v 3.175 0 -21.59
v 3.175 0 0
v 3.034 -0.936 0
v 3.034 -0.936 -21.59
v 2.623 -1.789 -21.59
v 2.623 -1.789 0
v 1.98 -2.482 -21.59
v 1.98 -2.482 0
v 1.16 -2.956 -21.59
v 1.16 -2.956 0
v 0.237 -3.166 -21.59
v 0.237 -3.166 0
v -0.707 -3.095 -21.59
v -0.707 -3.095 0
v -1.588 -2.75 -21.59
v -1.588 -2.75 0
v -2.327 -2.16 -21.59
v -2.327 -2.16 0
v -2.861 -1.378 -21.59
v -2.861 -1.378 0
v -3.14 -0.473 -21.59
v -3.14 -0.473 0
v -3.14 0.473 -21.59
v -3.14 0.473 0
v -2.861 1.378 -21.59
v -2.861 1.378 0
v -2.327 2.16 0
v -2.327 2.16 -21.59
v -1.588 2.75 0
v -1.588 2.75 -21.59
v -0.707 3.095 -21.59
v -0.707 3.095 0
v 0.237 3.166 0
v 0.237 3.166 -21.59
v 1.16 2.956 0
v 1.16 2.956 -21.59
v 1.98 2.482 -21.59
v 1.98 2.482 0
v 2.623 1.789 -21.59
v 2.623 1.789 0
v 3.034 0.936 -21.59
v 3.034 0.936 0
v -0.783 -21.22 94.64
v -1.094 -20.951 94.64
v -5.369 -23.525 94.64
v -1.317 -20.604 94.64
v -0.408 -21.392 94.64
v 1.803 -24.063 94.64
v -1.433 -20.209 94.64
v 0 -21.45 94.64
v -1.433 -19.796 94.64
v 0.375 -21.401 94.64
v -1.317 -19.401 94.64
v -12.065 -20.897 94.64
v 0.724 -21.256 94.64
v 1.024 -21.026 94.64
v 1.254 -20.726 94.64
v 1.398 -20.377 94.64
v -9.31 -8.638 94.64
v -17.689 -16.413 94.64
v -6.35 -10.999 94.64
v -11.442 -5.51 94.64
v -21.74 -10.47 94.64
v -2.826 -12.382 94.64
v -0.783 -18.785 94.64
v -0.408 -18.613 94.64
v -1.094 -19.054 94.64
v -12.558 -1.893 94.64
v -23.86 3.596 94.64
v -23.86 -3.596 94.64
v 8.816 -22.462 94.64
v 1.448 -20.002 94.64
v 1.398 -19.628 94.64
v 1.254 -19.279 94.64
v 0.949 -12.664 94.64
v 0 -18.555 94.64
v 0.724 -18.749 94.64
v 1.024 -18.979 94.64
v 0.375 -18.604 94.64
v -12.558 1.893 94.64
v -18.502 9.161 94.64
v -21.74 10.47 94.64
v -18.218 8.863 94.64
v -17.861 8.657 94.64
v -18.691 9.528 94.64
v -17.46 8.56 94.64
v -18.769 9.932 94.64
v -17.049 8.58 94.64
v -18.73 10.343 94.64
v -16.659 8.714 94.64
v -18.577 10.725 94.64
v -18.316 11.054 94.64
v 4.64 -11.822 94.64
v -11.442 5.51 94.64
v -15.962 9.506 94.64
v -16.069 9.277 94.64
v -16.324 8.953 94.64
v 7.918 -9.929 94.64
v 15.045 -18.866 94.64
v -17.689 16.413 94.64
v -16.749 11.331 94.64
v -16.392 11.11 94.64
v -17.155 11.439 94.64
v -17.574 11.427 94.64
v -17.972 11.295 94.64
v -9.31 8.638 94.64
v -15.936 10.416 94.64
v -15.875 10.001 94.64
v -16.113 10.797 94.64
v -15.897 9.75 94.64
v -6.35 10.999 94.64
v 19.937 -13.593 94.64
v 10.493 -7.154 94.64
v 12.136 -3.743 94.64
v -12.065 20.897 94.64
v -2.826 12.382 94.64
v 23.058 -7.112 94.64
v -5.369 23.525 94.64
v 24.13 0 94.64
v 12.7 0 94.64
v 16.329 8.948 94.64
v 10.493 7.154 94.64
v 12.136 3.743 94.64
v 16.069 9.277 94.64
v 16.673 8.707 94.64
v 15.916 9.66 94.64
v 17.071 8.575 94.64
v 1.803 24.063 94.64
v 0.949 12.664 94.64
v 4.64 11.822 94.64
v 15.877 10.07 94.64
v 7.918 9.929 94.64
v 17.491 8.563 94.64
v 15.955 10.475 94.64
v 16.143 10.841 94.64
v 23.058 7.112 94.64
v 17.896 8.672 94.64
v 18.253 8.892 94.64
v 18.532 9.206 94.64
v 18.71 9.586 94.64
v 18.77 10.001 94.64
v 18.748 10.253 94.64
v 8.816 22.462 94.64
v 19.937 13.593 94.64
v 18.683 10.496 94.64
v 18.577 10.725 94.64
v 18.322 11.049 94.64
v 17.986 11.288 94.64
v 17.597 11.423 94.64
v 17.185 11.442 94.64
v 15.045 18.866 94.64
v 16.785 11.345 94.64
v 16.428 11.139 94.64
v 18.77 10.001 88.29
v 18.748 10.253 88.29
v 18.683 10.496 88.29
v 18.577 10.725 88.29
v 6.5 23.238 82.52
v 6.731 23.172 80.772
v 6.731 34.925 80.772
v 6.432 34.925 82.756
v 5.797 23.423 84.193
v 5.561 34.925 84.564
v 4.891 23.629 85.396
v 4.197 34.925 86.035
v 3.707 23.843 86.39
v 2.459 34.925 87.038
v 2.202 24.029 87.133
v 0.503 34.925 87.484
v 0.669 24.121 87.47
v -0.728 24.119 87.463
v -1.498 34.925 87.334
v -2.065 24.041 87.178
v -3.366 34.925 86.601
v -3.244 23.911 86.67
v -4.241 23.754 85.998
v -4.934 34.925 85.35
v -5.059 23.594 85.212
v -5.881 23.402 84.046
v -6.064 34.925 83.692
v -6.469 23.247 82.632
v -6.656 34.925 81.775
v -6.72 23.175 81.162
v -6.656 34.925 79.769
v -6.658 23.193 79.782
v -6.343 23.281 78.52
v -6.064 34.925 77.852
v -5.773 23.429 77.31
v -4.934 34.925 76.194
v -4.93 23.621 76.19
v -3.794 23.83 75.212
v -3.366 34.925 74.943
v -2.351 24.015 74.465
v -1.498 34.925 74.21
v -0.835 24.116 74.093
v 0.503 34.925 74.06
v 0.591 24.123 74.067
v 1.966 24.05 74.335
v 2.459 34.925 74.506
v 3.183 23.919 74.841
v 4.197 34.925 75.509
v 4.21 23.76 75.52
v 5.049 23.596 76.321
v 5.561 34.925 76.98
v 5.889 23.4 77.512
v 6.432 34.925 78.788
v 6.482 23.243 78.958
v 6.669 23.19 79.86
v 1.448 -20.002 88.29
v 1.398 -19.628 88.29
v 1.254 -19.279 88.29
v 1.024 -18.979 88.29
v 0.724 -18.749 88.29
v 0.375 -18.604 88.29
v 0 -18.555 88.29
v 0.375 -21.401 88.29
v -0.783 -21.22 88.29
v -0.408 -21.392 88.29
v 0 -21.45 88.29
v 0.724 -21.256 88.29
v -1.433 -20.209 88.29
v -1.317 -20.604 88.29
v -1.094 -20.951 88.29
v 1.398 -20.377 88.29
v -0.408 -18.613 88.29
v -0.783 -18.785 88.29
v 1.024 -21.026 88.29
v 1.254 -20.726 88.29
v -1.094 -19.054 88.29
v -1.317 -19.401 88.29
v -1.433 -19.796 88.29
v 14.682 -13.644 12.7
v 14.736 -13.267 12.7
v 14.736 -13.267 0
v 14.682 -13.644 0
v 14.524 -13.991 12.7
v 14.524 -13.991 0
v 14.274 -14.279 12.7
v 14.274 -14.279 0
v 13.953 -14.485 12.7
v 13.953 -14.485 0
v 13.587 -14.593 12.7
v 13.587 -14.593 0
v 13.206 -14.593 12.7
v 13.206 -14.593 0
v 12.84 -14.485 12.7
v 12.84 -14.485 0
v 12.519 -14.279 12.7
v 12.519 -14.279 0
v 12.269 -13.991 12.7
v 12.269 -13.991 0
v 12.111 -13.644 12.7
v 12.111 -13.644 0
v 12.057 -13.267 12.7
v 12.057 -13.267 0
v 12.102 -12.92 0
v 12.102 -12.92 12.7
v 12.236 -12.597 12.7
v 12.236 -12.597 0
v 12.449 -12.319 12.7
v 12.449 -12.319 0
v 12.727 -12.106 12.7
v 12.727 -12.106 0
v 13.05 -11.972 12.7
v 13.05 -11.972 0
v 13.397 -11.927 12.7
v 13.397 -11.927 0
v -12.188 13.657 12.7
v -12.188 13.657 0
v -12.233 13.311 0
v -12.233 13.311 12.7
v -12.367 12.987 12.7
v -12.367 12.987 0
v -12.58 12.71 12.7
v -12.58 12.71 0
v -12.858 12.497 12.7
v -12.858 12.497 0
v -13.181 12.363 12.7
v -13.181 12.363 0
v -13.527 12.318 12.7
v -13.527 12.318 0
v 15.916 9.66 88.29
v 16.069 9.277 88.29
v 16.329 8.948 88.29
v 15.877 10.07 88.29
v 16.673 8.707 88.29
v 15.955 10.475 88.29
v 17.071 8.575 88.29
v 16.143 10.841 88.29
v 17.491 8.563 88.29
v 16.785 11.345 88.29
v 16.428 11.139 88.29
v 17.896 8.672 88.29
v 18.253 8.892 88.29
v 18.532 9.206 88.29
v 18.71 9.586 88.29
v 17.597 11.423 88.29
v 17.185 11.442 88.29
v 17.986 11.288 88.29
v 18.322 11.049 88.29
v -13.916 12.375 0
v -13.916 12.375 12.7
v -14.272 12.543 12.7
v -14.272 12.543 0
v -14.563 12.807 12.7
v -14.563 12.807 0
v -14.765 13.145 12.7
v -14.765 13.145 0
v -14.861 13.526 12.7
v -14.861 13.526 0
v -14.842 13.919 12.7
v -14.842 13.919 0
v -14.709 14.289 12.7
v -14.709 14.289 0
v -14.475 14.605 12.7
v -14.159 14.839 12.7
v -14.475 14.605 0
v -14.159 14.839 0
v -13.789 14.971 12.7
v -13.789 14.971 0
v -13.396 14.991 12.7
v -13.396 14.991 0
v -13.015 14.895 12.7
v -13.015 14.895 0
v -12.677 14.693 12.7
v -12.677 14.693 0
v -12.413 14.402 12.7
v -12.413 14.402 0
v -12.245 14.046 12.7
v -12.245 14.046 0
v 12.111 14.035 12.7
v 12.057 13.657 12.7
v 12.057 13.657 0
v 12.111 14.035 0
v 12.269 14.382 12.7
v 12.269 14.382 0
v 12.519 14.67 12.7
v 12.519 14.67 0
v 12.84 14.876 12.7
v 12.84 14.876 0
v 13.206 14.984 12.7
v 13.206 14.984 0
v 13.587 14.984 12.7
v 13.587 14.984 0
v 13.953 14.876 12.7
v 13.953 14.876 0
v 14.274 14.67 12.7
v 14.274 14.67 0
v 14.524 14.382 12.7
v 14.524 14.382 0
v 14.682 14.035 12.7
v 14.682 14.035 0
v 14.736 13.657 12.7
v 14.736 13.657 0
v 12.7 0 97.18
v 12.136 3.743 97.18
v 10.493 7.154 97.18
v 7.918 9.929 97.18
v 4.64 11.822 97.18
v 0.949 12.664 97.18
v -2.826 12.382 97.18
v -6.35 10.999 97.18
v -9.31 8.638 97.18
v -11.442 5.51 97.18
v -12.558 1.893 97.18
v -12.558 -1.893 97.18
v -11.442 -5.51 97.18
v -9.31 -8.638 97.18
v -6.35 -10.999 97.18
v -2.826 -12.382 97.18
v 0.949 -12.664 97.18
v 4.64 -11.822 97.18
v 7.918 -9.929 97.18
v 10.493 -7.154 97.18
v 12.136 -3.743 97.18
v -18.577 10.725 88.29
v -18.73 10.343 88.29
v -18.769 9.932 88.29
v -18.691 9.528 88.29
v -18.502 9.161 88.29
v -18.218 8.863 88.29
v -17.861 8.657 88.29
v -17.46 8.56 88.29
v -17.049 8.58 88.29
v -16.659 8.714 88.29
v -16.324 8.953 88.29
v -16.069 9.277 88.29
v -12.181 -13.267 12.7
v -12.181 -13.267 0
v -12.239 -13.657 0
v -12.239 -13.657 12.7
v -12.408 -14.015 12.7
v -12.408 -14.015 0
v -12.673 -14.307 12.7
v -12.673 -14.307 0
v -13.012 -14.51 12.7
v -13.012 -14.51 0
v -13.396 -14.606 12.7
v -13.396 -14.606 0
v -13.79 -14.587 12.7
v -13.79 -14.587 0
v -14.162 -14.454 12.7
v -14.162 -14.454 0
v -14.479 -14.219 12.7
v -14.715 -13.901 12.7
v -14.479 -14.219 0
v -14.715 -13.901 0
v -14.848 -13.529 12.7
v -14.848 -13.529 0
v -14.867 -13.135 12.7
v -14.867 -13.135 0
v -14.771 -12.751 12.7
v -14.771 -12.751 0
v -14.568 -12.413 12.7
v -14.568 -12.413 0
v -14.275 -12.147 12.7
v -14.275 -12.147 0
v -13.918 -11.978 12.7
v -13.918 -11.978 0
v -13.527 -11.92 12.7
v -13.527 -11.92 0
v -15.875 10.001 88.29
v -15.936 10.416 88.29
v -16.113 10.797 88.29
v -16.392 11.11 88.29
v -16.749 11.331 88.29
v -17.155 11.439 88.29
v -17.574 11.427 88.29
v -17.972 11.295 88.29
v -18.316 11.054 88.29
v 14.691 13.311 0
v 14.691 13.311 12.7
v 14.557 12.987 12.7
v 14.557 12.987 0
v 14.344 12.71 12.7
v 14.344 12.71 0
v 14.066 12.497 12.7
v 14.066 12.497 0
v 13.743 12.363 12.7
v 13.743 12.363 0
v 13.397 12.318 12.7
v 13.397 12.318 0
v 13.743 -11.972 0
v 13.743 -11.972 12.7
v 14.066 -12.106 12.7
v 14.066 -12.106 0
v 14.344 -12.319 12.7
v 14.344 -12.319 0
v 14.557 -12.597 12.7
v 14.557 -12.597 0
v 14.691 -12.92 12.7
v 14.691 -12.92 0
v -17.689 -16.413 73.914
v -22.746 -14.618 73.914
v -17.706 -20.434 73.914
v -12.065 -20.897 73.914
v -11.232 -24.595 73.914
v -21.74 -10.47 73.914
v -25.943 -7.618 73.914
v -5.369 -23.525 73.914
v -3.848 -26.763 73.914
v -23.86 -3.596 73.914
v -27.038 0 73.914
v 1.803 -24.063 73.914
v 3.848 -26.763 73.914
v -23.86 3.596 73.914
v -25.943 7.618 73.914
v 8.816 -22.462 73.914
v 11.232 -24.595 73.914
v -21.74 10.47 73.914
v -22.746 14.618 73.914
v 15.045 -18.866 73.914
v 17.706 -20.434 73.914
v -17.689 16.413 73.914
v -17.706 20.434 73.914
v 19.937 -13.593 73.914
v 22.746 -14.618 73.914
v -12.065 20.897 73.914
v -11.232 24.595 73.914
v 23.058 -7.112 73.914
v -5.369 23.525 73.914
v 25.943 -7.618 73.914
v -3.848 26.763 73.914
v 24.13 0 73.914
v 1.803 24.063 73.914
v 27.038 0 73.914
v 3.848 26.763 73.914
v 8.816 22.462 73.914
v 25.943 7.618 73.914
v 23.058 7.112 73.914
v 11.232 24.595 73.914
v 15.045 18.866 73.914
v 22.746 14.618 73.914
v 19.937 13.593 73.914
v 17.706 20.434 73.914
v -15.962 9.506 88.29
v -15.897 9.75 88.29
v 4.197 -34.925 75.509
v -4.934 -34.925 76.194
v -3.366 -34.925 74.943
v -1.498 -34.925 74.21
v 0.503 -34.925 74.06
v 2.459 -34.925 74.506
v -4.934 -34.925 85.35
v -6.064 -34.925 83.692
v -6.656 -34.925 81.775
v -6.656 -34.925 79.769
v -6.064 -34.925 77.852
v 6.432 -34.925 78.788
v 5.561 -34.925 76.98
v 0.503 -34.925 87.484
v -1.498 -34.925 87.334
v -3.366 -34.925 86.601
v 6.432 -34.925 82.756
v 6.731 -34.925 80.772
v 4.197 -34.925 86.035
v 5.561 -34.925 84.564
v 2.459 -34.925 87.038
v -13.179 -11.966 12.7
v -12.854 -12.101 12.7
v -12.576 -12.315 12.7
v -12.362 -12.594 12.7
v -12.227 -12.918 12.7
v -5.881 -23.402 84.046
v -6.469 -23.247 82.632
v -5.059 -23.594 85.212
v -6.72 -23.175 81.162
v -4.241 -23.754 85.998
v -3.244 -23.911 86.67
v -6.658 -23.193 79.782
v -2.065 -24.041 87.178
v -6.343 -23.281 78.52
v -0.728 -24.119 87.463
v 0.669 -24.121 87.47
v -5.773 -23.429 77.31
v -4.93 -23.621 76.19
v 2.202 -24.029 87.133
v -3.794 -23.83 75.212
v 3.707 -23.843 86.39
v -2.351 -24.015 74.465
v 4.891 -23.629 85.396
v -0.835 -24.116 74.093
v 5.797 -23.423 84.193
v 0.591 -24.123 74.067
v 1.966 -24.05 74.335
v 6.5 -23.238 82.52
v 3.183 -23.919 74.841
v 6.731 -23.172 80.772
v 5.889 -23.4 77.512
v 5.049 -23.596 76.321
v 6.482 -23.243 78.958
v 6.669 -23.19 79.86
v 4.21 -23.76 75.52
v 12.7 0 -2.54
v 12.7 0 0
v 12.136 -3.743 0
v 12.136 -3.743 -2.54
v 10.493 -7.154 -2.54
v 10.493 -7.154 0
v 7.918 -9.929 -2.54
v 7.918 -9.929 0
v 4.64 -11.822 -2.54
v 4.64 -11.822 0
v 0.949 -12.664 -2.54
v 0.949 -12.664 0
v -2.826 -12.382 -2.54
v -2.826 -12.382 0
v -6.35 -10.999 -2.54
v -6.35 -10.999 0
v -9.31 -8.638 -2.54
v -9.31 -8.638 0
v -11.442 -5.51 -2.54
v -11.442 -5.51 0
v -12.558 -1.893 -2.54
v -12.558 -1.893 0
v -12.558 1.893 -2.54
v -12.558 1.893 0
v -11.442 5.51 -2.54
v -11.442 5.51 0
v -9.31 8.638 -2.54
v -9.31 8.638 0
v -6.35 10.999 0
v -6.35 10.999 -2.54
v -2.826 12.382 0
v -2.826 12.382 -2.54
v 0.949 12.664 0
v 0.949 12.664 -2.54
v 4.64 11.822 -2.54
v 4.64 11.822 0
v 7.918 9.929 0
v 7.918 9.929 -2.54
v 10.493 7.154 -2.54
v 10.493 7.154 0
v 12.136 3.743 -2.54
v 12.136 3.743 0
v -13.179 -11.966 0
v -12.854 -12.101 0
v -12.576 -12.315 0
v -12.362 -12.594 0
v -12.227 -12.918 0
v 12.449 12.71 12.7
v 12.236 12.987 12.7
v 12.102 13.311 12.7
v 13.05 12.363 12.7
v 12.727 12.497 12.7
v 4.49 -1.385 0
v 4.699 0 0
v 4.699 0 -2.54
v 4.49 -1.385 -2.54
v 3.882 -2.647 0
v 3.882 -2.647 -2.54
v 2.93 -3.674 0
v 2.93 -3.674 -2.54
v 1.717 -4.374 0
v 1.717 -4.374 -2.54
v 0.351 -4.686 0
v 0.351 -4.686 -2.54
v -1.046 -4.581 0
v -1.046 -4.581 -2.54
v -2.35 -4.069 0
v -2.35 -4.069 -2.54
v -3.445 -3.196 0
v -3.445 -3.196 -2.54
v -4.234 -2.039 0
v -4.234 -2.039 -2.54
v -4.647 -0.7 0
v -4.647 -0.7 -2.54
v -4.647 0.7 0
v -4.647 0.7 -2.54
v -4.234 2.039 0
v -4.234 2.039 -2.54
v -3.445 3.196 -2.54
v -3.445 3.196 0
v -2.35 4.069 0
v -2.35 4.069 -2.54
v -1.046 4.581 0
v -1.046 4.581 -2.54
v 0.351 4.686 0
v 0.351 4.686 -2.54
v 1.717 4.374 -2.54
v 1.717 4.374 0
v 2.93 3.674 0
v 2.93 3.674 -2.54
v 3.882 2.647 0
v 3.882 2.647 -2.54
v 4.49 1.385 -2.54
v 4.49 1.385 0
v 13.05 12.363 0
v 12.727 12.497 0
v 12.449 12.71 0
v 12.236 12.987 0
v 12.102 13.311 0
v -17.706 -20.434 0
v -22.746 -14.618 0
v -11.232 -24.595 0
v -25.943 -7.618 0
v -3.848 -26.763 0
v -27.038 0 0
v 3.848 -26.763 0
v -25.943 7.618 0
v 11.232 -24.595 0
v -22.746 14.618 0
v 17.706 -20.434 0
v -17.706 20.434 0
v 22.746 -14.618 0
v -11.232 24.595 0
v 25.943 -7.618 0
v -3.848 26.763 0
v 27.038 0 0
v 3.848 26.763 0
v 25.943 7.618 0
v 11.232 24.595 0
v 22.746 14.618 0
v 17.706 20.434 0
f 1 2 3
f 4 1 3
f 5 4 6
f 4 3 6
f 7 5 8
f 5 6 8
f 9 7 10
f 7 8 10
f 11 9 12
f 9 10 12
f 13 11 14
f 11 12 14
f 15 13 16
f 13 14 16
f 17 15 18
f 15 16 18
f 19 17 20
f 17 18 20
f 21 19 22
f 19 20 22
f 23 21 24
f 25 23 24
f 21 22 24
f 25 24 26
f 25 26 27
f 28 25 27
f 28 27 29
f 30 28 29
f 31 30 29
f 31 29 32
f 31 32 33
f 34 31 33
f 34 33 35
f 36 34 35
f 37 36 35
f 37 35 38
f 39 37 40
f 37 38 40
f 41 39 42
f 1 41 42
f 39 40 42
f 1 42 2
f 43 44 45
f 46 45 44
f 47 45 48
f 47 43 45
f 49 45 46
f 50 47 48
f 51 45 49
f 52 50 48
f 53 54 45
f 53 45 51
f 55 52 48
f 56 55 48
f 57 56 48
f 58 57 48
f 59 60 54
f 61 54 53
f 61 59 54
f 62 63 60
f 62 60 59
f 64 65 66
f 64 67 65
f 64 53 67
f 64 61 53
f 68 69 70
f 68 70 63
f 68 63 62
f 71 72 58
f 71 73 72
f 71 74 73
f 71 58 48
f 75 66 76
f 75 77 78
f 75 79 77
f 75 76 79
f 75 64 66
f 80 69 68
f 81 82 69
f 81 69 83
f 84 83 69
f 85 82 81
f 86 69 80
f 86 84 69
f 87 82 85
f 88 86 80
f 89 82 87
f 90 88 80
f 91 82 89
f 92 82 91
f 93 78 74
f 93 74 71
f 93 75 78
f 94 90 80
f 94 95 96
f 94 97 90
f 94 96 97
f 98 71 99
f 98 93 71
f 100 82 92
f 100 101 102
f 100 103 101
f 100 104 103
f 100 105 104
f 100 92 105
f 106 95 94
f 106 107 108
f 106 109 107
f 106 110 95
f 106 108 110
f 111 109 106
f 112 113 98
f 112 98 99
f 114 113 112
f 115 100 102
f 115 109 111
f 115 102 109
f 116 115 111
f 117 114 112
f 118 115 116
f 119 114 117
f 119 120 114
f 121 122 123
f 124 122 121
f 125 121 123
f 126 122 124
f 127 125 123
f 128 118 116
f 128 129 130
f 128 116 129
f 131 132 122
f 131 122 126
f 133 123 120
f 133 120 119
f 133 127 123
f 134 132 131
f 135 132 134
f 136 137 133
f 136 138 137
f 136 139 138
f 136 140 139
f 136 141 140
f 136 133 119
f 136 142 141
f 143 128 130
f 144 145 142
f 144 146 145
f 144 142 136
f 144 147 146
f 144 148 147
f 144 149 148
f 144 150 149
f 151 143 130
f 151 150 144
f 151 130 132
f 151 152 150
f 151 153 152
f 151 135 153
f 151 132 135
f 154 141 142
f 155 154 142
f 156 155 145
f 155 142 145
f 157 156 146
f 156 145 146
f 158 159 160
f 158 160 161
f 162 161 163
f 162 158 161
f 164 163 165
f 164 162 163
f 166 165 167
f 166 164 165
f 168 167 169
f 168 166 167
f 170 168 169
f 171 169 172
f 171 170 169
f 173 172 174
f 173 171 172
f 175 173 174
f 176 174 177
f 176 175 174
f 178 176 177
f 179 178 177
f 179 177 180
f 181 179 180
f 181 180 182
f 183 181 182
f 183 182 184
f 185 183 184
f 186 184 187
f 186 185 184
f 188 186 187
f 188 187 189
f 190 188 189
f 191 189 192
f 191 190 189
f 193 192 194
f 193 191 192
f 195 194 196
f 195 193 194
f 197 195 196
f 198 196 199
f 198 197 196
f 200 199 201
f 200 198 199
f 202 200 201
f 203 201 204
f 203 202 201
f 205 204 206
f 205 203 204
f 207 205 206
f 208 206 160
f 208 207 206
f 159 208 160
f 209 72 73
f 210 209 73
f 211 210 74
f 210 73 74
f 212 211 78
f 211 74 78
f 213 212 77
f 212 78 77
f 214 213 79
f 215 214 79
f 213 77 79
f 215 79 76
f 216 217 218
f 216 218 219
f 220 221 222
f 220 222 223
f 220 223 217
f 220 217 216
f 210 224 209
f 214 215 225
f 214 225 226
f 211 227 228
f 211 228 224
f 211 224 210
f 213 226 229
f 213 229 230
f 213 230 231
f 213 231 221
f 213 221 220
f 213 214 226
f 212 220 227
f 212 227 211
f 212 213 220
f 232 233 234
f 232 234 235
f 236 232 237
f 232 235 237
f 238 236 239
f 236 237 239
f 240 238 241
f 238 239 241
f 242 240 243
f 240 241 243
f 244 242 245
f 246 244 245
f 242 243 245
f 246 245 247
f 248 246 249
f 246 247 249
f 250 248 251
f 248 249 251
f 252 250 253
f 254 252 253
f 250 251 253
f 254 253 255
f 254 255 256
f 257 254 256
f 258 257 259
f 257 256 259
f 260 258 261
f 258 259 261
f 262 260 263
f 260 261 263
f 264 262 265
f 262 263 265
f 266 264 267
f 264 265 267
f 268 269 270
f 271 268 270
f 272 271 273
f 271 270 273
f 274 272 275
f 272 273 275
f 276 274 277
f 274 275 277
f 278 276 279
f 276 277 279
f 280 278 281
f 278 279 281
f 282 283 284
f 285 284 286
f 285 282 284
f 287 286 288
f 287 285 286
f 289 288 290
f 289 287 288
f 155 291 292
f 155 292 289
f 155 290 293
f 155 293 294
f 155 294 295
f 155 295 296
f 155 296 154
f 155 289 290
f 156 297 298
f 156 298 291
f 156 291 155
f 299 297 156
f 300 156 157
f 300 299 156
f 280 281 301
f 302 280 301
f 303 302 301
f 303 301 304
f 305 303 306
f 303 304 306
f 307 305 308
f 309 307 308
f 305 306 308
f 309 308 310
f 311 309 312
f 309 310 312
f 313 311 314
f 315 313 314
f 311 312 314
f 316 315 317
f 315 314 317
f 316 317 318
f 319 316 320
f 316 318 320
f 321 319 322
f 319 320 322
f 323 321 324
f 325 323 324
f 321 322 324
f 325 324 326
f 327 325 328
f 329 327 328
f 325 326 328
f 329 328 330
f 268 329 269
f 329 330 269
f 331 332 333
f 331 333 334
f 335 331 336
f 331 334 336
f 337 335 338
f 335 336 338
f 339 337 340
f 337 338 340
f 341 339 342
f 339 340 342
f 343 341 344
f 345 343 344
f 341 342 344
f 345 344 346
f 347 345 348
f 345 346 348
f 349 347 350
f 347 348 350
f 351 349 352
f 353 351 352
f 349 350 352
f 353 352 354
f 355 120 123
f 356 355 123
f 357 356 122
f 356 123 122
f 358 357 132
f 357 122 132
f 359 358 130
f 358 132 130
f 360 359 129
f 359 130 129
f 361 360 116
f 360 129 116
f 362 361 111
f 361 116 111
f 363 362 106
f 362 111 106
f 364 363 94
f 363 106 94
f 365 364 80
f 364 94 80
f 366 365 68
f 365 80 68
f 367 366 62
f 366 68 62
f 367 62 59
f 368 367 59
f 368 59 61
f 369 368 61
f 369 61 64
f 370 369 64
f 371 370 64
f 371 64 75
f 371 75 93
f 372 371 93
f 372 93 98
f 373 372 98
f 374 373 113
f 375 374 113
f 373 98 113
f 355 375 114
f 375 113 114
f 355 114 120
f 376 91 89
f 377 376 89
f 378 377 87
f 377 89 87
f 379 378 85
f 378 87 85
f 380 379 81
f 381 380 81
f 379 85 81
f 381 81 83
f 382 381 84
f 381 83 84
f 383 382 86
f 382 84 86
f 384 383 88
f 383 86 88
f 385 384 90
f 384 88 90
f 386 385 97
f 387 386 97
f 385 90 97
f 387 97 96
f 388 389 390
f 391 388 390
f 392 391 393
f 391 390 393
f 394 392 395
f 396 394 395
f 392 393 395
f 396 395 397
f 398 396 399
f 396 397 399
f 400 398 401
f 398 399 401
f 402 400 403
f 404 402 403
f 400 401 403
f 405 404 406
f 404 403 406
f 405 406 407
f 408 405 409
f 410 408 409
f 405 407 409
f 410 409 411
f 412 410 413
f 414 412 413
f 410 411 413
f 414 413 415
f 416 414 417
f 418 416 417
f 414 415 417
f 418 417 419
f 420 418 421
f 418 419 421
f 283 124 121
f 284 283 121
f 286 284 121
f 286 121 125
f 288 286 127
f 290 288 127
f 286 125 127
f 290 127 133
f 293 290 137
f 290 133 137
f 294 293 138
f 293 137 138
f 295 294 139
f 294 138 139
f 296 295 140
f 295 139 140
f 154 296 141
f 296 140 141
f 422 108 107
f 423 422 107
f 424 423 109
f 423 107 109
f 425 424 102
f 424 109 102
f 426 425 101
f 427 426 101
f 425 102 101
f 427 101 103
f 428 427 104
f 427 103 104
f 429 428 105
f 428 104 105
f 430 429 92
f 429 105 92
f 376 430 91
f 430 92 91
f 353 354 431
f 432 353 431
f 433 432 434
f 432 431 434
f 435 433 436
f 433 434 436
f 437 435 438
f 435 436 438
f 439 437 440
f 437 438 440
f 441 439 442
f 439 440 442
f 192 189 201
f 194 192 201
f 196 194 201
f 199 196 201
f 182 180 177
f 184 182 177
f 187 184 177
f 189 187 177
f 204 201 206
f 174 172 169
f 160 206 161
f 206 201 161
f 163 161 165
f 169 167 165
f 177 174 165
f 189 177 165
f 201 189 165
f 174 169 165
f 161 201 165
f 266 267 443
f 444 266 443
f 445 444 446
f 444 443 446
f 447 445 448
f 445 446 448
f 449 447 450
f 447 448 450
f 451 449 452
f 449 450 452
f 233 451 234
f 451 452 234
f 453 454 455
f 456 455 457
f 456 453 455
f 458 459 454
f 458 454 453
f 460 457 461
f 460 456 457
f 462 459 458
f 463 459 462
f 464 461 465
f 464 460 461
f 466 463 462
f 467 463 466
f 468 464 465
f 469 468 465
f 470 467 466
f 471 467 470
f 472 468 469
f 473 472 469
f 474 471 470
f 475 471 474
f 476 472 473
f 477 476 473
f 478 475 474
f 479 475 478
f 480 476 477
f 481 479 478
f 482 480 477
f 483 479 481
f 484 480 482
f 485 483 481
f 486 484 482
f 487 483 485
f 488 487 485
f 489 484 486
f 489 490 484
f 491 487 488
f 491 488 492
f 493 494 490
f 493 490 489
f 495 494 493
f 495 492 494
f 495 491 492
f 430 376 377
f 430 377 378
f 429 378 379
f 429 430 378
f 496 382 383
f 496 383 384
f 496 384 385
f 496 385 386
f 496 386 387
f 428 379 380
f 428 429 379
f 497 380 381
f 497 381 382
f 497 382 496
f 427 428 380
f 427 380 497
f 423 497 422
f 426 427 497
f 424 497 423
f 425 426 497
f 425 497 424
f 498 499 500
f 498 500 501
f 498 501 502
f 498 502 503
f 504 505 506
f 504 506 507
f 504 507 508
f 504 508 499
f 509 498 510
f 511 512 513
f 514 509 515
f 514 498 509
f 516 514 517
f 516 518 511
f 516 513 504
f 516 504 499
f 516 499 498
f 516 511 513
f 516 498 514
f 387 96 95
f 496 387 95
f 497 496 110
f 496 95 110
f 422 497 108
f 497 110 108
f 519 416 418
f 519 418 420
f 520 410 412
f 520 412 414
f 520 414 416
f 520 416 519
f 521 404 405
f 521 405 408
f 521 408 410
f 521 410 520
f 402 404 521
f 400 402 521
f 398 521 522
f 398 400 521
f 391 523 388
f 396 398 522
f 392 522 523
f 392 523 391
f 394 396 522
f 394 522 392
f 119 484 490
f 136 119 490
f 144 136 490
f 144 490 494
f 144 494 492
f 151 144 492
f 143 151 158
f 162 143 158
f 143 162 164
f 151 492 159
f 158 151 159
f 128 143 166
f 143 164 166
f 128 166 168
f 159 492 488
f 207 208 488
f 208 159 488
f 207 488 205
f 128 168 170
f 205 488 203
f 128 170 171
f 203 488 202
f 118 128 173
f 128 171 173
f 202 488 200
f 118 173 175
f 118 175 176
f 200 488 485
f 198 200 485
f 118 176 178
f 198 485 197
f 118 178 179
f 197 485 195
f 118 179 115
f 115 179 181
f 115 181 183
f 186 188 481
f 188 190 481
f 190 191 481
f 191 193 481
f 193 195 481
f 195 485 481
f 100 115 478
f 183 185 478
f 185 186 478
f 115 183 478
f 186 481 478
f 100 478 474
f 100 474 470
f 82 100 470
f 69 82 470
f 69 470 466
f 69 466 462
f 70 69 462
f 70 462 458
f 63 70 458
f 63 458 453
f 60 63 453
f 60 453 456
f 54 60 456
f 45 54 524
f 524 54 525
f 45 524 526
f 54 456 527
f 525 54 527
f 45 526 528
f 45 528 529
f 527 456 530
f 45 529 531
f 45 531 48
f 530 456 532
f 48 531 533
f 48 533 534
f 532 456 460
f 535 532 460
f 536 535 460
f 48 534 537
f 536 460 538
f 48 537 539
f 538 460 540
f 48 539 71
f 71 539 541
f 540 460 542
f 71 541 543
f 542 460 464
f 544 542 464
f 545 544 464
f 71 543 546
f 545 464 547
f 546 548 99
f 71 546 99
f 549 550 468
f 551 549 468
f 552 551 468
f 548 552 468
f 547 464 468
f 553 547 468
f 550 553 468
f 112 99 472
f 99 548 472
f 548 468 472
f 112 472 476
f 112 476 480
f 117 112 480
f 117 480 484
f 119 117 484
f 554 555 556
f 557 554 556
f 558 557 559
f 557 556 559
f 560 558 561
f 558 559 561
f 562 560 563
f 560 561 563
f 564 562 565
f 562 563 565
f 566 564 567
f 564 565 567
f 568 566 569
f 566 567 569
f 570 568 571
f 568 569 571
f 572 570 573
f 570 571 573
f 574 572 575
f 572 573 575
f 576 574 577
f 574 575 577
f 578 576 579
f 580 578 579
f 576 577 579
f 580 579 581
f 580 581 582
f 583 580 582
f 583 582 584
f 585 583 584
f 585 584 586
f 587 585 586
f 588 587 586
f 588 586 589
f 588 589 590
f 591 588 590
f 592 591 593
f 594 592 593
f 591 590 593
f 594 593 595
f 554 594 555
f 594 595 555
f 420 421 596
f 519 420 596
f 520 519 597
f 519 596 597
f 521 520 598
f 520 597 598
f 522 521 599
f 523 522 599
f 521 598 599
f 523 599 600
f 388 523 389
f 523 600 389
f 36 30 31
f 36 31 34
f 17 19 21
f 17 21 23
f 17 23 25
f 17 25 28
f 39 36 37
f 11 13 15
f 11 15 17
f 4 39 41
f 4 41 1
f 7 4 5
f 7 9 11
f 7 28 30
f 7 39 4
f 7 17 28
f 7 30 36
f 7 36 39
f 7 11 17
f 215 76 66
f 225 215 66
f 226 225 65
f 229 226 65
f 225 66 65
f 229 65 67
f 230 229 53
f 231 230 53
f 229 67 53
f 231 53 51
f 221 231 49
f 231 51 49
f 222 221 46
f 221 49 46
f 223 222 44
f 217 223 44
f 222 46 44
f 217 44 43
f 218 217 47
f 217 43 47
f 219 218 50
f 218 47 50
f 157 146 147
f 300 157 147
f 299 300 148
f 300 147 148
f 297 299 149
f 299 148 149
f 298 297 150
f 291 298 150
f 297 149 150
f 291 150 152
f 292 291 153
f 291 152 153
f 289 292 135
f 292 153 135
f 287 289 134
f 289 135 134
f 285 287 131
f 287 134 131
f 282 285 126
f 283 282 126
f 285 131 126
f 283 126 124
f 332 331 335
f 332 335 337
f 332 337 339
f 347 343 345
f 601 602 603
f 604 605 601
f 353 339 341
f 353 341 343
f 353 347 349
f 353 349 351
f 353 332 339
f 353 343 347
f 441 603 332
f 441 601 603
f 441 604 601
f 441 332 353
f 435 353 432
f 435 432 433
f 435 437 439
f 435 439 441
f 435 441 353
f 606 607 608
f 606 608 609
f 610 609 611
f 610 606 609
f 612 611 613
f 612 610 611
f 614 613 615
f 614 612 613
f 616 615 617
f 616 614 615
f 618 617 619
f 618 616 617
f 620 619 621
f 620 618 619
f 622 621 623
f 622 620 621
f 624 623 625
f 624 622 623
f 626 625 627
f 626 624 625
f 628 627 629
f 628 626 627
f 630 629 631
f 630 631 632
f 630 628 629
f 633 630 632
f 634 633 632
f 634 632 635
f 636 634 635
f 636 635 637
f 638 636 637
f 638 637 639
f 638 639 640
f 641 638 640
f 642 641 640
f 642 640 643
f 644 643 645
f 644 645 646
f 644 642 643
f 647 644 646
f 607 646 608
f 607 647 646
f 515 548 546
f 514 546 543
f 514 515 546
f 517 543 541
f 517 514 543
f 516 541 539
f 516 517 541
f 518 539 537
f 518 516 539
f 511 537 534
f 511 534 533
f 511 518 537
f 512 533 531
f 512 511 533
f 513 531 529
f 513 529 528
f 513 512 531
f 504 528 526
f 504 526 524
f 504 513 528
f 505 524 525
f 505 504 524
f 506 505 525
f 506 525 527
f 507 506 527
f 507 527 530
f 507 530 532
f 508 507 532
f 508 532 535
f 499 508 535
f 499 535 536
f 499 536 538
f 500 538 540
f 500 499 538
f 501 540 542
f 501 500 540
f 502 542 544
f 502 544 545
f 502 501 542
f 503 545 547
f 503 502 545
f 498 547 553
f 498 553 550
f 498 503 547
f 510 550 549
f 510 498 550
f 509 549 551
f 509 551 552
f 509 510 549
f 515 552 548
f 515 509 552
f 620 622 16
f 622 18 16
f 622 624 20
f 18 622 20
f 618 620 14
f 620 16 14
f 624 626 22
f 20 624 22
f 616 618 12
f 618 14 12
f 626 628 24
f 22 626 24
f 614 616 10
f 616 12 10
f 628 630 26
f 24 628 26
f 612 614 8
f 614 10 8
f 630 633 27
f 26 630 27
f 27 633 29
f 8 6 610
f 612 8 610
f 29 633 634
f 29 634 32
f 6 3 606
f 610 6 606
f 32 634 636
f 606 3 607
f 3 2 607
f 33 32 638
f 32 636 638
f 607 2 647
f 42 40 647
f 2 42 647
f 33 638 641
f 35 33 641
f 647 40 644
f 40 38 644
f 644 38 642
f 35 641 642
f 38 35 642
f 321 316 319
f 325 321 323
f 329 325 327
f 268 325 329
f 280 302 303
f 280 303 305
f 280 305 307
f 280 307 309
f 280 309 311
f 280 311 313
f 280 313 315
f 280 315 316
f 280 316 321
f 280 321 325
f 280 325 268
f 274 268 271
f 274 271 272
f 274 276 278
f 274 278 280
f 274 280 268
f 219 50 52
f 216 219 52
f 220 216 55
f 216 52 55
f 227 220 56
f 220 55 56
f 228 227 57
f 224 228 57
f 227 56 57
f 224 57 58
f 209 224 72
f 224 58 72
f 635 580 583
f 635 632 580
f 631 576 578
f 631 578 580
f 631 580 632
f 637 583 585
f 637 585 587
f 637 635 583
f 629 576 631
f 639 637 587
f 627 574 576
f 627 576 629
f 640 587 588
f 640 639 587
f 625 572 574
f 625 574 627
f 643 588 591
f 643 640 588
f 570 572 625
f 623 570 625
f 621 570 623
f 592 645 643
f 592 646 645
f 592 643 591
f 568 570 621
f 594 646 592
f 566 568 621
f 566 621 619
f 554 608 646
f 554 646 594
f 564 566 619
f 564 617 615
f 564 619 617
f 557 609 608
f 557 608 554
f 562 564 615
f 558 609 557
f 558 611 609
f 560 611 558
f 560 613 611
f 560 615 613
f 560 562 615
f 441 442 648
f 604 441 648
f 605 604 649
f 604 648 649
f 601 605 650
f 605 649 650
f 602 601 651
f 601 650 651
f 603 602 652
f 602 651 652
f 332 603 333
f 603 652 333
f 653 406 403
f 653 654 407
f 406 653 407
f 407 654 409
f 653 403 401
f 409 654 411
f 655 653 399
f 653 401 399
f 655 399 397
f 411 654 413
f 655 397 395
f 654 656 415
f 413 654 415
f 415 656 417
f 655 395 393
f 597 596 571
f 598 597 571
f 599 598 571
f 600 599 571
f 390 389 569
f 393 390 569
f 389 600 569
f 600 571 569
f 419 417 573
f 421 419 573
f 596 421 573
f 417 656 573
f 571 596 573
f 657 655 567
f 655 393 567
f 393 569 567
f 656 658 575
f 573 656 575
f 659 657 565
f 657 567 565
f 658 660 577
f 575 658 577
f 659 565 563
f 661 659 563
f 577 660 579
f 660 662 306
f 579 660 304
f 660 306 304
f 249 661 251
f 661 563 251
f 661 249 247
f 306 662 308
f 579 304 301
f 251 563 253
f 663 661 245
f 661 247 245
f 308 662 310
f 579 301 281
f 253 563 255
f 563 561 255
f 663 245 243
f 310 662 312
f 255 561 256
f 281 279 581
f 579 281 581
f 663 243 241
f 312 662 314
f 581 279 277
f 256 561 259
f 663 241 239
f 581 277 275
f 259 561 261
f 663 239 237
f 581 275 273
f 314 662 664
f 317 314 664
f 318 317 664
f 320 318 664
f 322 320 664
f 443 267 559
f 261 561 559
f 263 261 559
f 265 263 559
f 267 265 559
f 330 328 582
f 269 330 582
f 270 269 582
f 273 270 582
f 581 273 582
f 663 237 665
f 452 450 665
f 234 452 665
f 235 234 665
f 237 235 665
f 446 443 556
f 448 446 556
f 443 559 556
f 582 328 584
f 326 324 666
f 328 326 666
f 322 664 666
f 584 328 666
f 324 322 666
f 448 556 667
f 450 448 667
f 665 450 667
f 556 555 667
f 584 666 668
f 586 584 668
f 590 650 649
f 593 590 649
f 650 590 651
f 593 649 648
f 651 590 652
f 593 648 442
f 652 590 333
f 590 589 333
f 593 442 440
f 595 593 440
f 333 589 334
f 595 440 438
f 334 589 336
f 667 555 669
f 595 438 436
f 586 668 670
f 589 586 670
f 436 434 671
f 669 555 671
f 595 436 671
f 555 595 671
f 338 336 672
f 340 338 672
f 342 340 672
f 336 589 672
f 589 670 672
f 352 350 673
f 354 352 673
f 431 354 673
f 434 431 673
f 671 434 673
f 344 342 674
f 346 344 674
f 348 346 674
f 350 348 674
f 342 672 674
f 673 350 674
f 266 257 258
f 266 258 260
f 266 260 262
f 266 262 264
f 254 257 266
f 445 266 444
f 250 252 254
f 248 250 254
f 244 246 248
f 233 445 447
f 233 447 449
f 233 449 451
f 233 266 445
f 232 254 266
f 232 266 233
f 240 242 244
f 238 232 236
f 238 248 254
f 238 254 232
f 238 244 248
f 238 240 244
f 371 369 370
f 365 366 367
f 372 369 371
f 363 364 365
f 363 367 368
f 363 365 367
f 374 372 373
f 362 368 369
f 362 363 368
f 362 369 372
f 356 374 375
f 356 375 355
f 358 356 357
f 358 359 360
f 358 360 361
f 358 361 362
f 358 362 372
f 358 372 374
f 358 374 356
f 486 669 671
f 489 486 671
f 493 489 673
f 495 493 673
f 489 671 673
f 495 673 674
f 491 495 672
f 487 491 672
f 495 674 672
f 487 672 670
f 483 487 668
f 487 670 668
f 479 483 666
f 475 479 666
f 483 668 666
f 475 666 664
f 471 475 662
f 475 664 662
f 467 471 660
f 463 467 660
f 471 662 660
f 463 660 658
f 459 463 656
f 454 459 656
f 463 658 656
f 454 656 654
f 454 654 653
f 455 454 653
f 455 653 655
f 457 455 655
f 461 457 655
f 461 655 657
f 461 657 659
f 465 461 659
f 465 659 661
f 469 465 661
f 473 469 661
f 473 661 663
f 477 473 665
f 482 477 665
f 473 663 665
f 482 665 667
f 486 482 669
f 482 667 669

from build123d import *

# Parameters (mm, degrees)
F0_R      = 27.0383
F1_DEPTH  = 73.914
F2_R      = 24.13
F3_DEPTH  = 20.7264
F4_R      = 12.7
F5_DEPTH  = 2.54
F6_R      = 12.7
F6_R_2    = 4.699
F7_DEPTH  = 2.54
F8_R      = 3.175
F9_DEPTH  = 21.59
F10_R     = 6.731
F11_DEPTH = 34.925
F13_DEPTH = 6.35
F15_DEPTH = 12.7


with BuildPart() as f1:
    # F0 (on Top) → F1 (new body)
    with BuildSketch(Plane.XY):
        Circle(F0_R)
    extrude(amount=F1_DEPTH)

    # F2 (on face) → F3 (join)
    with BuildSketch(Plane.XY.offset(73.914)):
        Circle(F2_R)
    extrude(amount=F3_DEPTH)

    # F4 (on face) → F5 (join)
    with BuildSketch(Plane.XY.offset(94.6404)):
        Circle(F4_R)
    extrude(amount=F5_DEPTH)

    # F6 (on face) → F7 (join)
    with BuildSketch(Plane(origin=(0, 0, 0), x_dir=(1, 0, 0), z_dir=(0, 0, -1))):
        Circle(F6_R)
        Circle(F6_R_2, mode=Mode.SUBTRACT)
    extrude(amount=F7_DEPTH)

    # F8 (on face) → F9 (join)
    with BuildSketch(Plane(origin=(0, 0, 0), x_dir=(1, 0, 0), z_dir=(0, 0, -1))):
        Circle(F8_R)
    extrude(amount=F9_DEPTH)

    # F10 (on Front) → F11 (join, symmetric)
    with BuildSketch(Plane.XZ):
        with Locations((0, 80.772)):
            Circle(F10_R)
    extrude(amount=F11_DEPTH, both=True)

    # F12 (on face) → F13 (cut)
    with BuildSketch(Plane.XY.offset(94.6404)):
        with BuildLine():
            ThreePointArc((-15.8748731392, 10.00125), (-16.9479549257, 11.3997174113), (-18.5765047188, 10.72515))
            Line((-18.5765047188, 10.72515), (-16.0688415596, 9.27735))
            ThreePointArc((-16.0688415596, 9.27735), (-15.9242057279, 9.6265317865), (-15.8748731392, 10.00125))
        make_face()
        with BuildLine():
            Line((-16.0688415596, 9.27735), (-18.5765047188, 10.72515))
            ThreePointArc((-18.5765047188, 10.72515), (-18.0465731392, 8.7474184204), (-16.0688415596, 9.27735))
        make_face()
        with BuildLine():
            Line((0, -18.5547), (0, -21.4503))
            ThreePointArc((0, -21.4503), (1.0237491978, -21.0262491978), (1.4478, -20.0025))
            ThreePointArc((1.4478, -20.0025), (1.0237491978, -18.9787508022), (0, -18.5547))
        make_face()
        with BuildLine():
            ThreePointArc((0, -18.5547), (-1.4478, -20.0025), (0, -21.4503))
            Line((0, -21.4503), (0, -18.5547))
        make_face()
        with BuildLine():
            Line((16.0688415596, 9.27735), (18.5765047188, 10.72515))
            ThreePointArc((18.5765047188, 10.72515), (16.5987731392, 11.2550815796), (16.0688415596, 9.27735))
        make_face()
        with BuildLine():
            ThreePointArc((18.7704731392, 10.00125), (18.7211405505, 10.3759682135), (18.5765047188, 10.72515))
            Line((18.5765047188, 10.72515), (16.0688415596, 9.27735))
            ThreePointArc((16.0688415596, 9.27735), (17.6973913527, 8.6027825887), (18.7704731392, 10.00125))
        make_face()
    extrude(amount=-F13_DEPTH, mode=Mode.SUBTRACT)

    # F14 (on face) → F15 (cut)
    with BuildSketch(Plane(origin=(0, 0, 0), x_dir=(1, 0, 0), z_dir=(0, 0, -1))):
        with BuildLine():
            ThreePointArc((14.7363675327, 13.2666150431), (13.3965175327, 14.6064650431), (12.0566675327, 13.2666150431))
            Line((12.0566675327, 13.2666150431), (13.3965175327, 13.2666150431))
            Line((13.3965175327, 13.2666150431), (13.3965175327, 11.9267650431))
            ThreePointArc((13.3965175327, 11.9267650431), (14.3439345535, 12.3191980223), (14.7363675327, 13.2666150431))
        make_face()
        with BuildLine():
            Line((13.3965175327, 13.2666150431), (12.0566675327, 13.2666150431))
            ThreePointArc((12.0566675327, 13.2666150431), (12.4491005119, 12.3191980223), (13.3965175327, 11.9267650431))
            Line((13.3965175327, 11.9267650431), (13.3965175327, 13.2666150431))
        make_face()
        with BuildLine():
            ThreePointArc((14.7363675327, -13.6573849569), (14.3439345535, -12.7099679361), (13.3965175327, -12.3175349569))
            Line((13.3965175327, -12.3175349569), (13.3965175327, -13.6573849569))
            Line((13.3965175327, -13.6573849569), (12.0566675327, -13.6573849569))
            ThreePointArc((12.0566675327, -13.6573849569), (13.3965175327, -14.9972349569), (14.7363675327, -13.6573849569))
        make_face()
        with BuildLine():
            Line((13.3965175327, -13.6573849569), (13.3965175327, -12.3175349569))
            ThreePointArc((13.3965175327, -12.3175349569), (12.4491005119, -12.7099679361), (12.0566675327, -13.6573849569))
            Line((12.0566675327, -13.6573849569), (13.3965175327, -13.6573849569))
        make_face()
        with BuildLine():
            Line((-12.1812824673, 13.2666150431), (-13.5274824673, 13.2666150431))
            Line((-13.5274824673, 13.2666150431), (-13.5274824673, 11.9204150431))
            ThreePointArc((-13.5274824673, 11.9204150431), (-12.5755753185, 12.3147078943), (-12.1812824673, 13.2666150431))
        make_face()
        with BuildLine():
            Line((-13.5274824673, 11.9204150431), (-13.5274824673, 13.2666150431))
            Line((-13.5274824673, 13.2666150431), (-12.1812824673, 13.2666150431))
            ThreePointArc((-12.1812824673, 13.2666150431), (-14.4793896162, 14.2185221919), (-13.5274824673, 11.9204150431))
        make_face()
        with BuildLine():
            ThreePointArc((-12.1876324673, -13.6573849569), (-12.5800654465, -12.7099679361), (-13.5274824673, -12.3175349569))
            Line((-13.5274824673, -12.3175349569), (-13.5274824673, -13.6573849569))
            Line((-13.5274824673, -13.6573849569), (-12.1876324673, -13.6573849569))
        make_face()
        with BuildLine():
            Line((-13.5274824673, -13.6573849569), (-13.5274824673, -12.3175349569))
            ThreePointArc((-13.5274824673, -12.3175349569), (-14.4748994881, -14.6048019777), (-12.1876324673, -13.6573849569))
            Line((-12.1876324673, -13.6573849569), (-13.5274824673, -13.6573849569))
        make_face()
    extrude(amount=-F15_DEPTH, mode=Mode.SUBTRACT)


solid = f1.part
